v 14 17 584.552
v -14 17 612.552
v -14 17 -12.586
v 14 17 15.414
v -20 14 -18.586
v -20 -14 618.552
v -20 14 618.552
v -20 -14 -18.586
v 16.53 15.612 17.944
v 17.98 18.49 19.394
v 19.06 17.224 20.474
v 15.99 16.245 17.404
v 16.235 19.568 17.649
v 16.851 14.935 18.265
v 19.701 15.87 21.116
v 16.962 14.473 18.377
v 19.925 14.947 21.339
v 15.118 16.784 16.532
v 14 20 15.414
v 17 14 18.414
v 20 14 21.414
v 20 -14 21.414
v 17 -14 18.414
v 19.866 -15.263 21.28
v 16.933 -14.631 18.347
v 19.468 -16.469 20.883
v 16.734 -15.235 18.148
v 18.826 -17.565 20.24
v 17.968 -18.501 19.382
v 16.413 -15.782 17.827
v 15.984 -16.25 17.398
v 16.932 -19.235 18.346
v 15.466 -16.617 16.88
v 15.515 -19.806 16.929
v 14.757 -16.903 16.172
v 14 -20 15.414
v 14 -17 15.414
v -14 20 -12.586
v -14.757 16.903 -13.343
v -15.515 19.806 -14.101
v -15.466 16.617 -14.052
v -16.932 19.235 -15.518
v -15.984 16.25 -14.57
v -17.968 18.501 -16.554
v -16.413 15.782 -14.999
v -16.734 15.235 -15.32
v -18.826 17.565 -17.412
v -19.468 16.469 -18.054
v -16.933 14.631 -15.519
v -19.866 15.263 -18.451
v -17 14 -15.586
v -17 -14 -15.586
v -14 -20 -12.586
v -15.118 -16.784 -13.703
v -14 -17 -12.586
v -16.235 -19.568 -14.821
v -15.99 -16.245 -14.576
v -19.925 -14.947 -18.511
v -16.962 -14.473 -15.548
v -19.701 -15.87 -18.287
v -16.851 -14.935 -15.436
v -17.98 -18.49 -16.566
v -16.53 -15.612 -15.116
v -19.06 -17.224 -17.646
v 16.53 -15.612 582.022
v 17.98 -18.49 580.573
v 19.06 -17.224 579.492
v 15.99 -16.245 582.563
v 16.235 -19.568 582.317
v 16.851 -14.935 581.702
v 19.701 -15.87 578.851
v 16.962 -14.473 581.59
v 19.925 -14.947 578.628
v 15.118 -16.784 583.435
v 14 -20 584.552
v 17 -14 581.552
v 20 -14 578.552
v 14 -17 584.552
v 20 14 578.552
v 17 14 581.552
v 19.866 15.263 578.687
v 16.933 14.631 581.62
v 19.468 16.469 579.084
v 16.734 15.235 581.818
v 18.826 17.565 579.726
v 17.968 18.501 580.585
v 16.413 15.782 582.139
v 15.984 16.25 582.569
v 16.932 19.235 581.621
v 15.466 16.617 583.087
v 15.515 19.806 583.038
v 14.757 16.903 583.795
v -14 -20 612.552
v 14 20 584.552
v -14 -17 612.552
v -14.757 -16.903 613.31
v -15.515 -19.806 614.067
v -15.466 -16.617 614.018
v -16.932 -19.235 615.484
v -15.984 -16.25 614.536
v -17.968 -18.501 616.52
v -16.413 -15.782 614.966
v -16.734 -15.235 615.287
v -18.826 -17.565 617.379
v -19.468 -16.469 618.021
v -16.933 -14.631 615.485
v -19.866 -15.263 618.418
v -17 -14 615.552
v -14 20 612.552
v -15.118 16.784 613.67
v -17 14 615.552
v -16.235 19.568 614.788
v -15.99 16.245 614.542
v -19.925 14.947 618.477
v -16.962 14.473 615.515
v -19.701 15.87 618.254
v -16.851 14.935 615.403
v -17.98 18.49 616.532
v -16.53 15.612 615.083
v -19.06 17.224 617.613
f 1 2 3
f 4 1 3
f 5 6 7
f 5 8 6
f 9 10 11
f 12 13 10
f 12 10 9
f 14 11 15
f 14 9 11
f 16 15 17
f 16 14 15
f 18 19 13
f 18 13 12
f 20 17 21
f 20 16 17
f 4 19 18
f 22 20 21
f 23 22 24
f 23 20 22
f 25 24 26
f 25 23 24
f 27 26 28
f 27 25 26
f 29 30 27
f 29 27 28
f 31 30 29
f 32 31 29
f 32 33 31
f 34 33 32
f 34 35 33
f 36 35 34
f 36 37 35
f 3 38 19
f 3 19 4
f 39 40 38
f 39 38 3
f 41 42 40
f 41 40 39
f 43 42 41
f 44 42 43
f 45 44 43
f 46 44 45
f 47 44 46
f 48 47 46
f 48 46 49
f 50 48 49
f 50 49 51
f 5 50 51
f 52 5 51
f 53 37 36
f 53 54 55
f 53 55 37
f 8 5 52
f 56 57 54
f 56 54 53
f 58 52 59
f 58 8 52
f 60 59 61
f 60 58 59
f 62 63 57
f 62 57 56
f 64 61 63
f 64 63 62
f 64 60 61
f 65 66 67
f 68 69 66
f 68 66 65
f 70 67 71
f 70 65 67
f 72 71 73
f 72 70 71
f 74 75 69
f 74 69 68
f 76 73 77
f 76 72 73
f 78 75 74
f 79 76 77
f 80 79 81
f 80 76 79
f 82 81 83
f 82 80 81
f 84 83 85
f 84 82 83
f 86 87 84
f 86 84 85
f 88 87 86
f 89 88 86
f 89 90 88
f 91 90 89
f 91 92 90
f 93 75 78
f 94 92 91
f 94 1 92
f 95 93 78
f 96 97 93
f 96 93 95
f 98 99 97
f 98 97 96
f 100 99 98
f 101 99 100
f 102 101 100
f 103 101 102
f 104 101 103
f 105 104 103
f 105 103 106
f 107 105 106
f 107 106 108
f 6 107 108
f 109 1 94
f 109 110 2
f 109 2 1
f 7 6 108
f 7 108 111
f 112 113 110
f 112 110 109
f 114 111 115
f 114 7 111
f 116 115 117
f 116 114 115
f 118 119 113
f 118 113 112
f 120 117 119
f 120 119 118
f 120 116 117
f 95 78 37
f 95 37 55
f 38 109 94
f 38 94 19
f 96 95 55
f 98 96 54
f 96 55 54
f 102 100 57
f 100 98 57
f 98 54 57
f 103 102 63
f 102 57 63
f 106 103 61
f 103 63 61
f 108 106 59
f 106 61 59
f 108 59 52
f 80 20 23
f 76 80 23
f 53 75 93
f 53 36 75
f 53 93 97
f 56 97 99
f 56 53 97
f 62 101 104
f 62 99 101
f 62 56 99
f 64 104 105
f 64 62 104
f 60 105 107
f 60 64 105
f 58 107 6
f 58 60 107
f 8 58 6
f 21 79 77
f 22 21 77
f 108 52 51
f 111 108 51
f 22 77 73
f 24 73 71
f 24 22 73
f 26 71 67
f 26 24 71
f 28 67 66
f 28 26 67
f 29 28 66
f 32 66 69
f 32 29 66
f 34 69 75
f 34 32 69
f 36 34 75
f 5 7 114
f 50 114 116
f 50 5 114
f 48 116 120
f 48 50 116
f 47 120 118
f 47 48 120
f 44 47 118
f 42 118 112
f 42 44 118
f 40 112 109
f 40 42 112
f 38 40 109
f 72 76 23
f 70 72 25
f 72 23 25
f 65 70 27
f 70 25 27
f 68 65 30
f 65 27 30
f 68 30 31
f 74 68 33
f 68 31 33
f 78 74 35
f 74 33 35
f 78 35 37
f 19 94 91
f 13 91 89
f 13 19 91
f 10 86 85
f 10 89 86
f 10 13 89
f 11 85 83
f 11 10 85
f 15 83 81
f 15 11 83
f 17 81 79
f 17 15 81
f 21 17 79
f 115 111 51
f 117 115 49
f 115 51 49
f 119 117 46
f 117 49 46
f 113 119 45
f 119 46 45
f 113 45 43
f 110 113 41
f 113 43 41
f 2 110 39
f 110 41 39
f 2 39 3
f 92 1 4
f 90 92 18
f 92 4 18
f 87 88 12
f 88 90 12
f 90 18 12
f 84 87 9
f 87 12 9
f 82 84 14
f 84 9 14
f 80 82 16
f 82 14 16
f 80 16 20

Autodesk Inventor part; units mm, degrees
ref_plane "Start Plane" through (0, 0, -18.5858) normal (0, 0, 1) x (1, 0, 0)
ref_plane "End Plane" through (0, 0, 618.5525) normal (0, 0, 1) x (1, 0, 0)
sketch "Sketch" plane through (0, 0, 0) normal (0, 0, 1) x (1, 0, 0)
  line L0 (-20, -14) -> (-20, 14)
  line L1 (-14, 20) -> (14, 20)
  line L2 (20, 14) -> (20, -14)
  line L3 (14, -20) -> (-14, -20)
  arc A0 (-20, -14) -> (-14, -20) centre (-14, -14) ccw
  arc A1 (20, 14) -> (14, 20) centre (14, 14) ccw
  arc A2 (-14, 20) -> (-20, 14) centre (-14, 14) ccw
  arc A3 (14, -20) -> (20, -14) centre (14, -14) ccw
  arc A4 (-14, 17) -> (-17, 14) centre (-14, 14) ccw
  line L4 (-14, 17) -> (14, 17)
  arc A5 (17, 14) -> (14, 17) centre (14, 14) ccw
  line L5 (17, 14) -> (17, -14)
  arc A6 (14, -17) -> (17, -14) centre (14, -14) ccw
  line L6 (14, -17) -> (-14, -17)
  arc A7 (-17, -14) -> (-14, -17) centre (-14, -14) ccw
  line L7 (-17, -14) -> (-17, 14)
  line L8 (0, 29.7397) -> (0, -29.7397) construction
  line L9 (-29.7397, 0) -> (29.7397, 0) construction
  dimension "d7" = 6
  dimension "d9" = 40
  dimension "d11" = 40
  dimension "d12" = 3
  dimension "d15" = 20
  dimension "d16" = 20
extrude "Body" add sketch "Sketch" along normal up to surface (637.1383 mm away) from surface at -18.5858
sketch "Sketch3" plane through (0, 0, 0) normal (0, 0, 1) x (1, 0, 0)
  line L0 (0, 0) -> (10, 0)
ref_plane "Work Plane3" through (0, 0, 0) normal (0, -1, 0) x (1, 0, 0)
ref_plane "Work Plane4" through (-20.7071, 0, 619.2596) normal (0.7071, 0, 0.7071) x (0.7071, 0, -0.7071)
split "Split1" plane through (-20.7071, 0, 619.2596) removes the side toward (0.7071, 0, 0.7071)
ref_plane "Work Plane5" through (-20.7071, 0, -19.2929) normal (0.7071, 0, -0.7071) x (-0.7071, 0, -0.7071)
split "Split2" plane through (-20.7071, 0, -19.2929) removes the side toward (0.7071, 0, -0.7071)
sketch "Sketch4" plane through (0, 0, 0) normal (0, -1, 0) x (1, 0, 0)
  line L0 (-2, -18.5858) -> (12, -18.5858) projected
  line L1 (-2, 618.5525) -> (12, 618.5525) projected
  dimension "d18" = 637.1383
equation "\"d7\" = G_IR"
equation "\"d9\" = G_W"
equation "\"d11\" = G_H"
equation "\"d12\" = G_T"
equation "\"d15\" = 0.5 * d9"
equation "\"d16\" = 0.5 * d11"
equation "\"d3\" = G_L"
equation "\"G_W\" = 40"
equation "\"G_H\" = 40"
equation "\"G_T\" = 3"
equation "\"G_IR\" = 6"
equation "\"G_L\" = d18"
equation "\"G_OFFSET_START\" = 18.58579"
equation "\"G_OFFSET_END\" = 18.58579"
equation "\"d13\" = -G_OFFSET_START"
equation "\"d14\" = G_OFFSET_END + B_L"
equation "\"B_L\" = 599.96675"
properties part number "ISO 10799-2 - 40x40x3 - 637,14" material "Steel, Mild"
